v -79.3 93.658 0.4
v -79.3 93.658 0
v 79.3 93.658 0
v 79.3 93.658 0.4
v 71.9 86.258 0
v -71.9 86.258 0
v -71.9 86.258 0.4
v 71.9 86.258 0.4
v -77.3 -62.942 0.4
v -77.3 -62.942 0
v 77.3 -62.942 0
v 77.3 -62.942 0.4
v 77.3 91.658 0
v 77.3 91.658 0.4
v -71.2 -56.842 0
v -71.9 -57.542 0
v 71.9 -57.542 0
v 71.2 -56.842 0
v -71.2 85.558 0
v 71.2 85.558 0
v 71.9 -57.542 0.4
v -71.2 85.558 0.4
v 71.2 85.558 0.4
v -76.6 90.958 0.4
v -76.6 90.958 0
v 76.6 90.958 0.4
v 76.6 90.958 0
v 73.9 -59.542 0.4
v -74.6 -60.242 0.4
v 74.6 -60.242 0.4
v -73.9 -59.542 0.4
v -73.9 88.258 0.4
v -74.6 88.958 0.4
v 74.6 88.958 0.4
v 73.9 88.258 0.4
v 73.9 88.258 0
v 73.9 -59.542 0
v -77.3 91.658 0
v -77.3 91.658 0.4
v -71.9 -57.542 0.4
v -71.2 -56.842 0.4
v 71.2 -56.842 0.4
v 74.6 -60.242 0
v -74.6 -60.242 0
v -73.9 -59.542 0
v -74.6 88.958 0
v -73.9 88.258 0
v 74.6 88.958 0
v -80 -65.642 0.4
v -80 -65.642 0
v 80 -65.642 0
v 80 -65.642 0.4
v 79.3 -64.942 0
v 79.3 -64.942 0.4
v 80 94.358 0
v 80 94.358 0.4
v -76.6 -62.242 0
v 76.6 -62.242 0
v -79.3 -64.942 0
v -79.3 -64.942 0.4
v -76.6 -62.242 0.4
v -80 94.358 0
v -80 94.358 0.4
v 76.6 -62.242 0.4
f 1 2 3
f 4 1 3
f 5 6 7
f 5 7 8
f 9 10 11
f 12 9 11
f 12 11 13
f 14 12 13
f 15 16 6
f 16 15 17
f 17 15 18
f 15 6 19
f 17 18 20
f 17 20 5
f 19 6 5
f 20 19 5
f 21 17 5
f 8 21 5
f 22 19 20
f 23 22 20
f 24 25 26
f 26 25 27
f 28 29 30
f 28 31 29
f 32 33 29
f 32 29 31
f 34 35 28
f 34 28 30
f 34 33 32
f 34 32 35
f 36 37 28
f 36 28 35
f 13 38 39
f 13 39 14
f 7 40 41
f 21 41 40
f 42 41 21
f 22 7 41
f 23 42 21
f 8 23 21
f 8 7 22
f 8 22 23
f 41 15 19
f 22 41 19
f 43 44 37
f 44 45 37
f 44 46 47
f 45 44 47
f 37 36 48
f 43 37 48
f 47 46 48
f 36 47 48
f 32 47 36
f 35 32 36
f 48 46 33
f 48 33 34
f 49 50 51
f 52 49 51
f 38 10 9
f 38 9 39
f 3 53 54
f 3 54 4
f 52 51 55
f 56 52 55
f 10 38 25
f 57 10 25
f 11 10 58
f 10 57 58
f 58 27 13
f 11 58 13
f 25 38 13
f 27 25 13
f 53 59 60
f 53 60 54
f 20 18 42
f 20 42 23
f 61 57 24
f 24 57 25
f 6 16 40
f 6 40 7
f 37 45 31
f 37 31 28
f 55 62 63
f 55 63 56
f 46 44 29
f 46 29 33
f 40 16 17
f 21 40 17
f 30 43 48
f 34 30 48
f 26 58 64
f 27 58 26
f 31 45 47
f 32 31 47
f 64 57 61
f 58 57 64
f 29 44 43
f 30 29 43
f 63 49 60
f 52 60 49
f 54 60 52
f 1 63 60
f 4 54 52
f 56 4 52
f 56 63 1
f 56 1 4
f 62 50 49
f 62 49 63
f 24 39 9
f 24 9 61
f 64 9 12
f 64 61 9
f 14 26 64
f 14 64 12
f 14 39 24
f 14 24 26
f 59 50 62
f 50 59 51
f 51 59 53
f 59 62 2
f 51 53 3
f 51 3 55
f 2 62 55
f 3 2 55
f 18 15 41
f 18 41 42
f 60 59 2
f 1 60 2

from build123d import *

# Parameters (mm, degrees)
F0_W     = 160
F0_H     = 160
F0_W_2   = 158.6
F0_H_2   = 158.6
F0_W_3   = 154.6
F0_H_3   = 154.6
F0_W_4   = 153.2
F0_H_4   = 153.2
F0_W_5   = 149.2
F0_H_5   = 149.2
F0_W_6   = 147.8
F0_H_6   = 147.8
F0_W_7   = 143.8
F0_H_7   = 143.8
F0_W_8   = 142.4
F0_H_8   = 142.4
F1_DEPTH = 0.4


with BuildPart() as f1:
    # F0 (on Top) → F1 (new body)
    with BuildSketch(Plane.XY):
        with Locations((0, 14.357793)):
            Rectangle(F0_W, F0_H)
        with Locations((0, 14.357793)):
            Rectangle(F0_W_2, F0_H_2, mode=Mode.SUBTRACT)
        with Locations((0, 14.357793)):
            Rectangle(F0_W_3, F0_H_3)
        with Locations((0, 14.357793)):
            Rectangle(F0_W_4, F0_H_4, mode=Mode.SUBTRACT)
        with Locations((0, 14.357793)):
            Rectangle(F0_W_5, F0_H_5)
        with Locations((0, 14.357793)):
            Rectangle(F0_W_6, F0_H_6, mode=Mode.SUBTRACT)
        with Locations((0, 14.357793)):
            Rectangle(F0_W_7, F0_H_7)
        with Locations((0, 14.357793)):
            Rectangle(F0_W_8, F0_H_8, mode=Mode.SUBTRACT)
    extrude(amount=F1_DEPTH)


solid = f1.part
